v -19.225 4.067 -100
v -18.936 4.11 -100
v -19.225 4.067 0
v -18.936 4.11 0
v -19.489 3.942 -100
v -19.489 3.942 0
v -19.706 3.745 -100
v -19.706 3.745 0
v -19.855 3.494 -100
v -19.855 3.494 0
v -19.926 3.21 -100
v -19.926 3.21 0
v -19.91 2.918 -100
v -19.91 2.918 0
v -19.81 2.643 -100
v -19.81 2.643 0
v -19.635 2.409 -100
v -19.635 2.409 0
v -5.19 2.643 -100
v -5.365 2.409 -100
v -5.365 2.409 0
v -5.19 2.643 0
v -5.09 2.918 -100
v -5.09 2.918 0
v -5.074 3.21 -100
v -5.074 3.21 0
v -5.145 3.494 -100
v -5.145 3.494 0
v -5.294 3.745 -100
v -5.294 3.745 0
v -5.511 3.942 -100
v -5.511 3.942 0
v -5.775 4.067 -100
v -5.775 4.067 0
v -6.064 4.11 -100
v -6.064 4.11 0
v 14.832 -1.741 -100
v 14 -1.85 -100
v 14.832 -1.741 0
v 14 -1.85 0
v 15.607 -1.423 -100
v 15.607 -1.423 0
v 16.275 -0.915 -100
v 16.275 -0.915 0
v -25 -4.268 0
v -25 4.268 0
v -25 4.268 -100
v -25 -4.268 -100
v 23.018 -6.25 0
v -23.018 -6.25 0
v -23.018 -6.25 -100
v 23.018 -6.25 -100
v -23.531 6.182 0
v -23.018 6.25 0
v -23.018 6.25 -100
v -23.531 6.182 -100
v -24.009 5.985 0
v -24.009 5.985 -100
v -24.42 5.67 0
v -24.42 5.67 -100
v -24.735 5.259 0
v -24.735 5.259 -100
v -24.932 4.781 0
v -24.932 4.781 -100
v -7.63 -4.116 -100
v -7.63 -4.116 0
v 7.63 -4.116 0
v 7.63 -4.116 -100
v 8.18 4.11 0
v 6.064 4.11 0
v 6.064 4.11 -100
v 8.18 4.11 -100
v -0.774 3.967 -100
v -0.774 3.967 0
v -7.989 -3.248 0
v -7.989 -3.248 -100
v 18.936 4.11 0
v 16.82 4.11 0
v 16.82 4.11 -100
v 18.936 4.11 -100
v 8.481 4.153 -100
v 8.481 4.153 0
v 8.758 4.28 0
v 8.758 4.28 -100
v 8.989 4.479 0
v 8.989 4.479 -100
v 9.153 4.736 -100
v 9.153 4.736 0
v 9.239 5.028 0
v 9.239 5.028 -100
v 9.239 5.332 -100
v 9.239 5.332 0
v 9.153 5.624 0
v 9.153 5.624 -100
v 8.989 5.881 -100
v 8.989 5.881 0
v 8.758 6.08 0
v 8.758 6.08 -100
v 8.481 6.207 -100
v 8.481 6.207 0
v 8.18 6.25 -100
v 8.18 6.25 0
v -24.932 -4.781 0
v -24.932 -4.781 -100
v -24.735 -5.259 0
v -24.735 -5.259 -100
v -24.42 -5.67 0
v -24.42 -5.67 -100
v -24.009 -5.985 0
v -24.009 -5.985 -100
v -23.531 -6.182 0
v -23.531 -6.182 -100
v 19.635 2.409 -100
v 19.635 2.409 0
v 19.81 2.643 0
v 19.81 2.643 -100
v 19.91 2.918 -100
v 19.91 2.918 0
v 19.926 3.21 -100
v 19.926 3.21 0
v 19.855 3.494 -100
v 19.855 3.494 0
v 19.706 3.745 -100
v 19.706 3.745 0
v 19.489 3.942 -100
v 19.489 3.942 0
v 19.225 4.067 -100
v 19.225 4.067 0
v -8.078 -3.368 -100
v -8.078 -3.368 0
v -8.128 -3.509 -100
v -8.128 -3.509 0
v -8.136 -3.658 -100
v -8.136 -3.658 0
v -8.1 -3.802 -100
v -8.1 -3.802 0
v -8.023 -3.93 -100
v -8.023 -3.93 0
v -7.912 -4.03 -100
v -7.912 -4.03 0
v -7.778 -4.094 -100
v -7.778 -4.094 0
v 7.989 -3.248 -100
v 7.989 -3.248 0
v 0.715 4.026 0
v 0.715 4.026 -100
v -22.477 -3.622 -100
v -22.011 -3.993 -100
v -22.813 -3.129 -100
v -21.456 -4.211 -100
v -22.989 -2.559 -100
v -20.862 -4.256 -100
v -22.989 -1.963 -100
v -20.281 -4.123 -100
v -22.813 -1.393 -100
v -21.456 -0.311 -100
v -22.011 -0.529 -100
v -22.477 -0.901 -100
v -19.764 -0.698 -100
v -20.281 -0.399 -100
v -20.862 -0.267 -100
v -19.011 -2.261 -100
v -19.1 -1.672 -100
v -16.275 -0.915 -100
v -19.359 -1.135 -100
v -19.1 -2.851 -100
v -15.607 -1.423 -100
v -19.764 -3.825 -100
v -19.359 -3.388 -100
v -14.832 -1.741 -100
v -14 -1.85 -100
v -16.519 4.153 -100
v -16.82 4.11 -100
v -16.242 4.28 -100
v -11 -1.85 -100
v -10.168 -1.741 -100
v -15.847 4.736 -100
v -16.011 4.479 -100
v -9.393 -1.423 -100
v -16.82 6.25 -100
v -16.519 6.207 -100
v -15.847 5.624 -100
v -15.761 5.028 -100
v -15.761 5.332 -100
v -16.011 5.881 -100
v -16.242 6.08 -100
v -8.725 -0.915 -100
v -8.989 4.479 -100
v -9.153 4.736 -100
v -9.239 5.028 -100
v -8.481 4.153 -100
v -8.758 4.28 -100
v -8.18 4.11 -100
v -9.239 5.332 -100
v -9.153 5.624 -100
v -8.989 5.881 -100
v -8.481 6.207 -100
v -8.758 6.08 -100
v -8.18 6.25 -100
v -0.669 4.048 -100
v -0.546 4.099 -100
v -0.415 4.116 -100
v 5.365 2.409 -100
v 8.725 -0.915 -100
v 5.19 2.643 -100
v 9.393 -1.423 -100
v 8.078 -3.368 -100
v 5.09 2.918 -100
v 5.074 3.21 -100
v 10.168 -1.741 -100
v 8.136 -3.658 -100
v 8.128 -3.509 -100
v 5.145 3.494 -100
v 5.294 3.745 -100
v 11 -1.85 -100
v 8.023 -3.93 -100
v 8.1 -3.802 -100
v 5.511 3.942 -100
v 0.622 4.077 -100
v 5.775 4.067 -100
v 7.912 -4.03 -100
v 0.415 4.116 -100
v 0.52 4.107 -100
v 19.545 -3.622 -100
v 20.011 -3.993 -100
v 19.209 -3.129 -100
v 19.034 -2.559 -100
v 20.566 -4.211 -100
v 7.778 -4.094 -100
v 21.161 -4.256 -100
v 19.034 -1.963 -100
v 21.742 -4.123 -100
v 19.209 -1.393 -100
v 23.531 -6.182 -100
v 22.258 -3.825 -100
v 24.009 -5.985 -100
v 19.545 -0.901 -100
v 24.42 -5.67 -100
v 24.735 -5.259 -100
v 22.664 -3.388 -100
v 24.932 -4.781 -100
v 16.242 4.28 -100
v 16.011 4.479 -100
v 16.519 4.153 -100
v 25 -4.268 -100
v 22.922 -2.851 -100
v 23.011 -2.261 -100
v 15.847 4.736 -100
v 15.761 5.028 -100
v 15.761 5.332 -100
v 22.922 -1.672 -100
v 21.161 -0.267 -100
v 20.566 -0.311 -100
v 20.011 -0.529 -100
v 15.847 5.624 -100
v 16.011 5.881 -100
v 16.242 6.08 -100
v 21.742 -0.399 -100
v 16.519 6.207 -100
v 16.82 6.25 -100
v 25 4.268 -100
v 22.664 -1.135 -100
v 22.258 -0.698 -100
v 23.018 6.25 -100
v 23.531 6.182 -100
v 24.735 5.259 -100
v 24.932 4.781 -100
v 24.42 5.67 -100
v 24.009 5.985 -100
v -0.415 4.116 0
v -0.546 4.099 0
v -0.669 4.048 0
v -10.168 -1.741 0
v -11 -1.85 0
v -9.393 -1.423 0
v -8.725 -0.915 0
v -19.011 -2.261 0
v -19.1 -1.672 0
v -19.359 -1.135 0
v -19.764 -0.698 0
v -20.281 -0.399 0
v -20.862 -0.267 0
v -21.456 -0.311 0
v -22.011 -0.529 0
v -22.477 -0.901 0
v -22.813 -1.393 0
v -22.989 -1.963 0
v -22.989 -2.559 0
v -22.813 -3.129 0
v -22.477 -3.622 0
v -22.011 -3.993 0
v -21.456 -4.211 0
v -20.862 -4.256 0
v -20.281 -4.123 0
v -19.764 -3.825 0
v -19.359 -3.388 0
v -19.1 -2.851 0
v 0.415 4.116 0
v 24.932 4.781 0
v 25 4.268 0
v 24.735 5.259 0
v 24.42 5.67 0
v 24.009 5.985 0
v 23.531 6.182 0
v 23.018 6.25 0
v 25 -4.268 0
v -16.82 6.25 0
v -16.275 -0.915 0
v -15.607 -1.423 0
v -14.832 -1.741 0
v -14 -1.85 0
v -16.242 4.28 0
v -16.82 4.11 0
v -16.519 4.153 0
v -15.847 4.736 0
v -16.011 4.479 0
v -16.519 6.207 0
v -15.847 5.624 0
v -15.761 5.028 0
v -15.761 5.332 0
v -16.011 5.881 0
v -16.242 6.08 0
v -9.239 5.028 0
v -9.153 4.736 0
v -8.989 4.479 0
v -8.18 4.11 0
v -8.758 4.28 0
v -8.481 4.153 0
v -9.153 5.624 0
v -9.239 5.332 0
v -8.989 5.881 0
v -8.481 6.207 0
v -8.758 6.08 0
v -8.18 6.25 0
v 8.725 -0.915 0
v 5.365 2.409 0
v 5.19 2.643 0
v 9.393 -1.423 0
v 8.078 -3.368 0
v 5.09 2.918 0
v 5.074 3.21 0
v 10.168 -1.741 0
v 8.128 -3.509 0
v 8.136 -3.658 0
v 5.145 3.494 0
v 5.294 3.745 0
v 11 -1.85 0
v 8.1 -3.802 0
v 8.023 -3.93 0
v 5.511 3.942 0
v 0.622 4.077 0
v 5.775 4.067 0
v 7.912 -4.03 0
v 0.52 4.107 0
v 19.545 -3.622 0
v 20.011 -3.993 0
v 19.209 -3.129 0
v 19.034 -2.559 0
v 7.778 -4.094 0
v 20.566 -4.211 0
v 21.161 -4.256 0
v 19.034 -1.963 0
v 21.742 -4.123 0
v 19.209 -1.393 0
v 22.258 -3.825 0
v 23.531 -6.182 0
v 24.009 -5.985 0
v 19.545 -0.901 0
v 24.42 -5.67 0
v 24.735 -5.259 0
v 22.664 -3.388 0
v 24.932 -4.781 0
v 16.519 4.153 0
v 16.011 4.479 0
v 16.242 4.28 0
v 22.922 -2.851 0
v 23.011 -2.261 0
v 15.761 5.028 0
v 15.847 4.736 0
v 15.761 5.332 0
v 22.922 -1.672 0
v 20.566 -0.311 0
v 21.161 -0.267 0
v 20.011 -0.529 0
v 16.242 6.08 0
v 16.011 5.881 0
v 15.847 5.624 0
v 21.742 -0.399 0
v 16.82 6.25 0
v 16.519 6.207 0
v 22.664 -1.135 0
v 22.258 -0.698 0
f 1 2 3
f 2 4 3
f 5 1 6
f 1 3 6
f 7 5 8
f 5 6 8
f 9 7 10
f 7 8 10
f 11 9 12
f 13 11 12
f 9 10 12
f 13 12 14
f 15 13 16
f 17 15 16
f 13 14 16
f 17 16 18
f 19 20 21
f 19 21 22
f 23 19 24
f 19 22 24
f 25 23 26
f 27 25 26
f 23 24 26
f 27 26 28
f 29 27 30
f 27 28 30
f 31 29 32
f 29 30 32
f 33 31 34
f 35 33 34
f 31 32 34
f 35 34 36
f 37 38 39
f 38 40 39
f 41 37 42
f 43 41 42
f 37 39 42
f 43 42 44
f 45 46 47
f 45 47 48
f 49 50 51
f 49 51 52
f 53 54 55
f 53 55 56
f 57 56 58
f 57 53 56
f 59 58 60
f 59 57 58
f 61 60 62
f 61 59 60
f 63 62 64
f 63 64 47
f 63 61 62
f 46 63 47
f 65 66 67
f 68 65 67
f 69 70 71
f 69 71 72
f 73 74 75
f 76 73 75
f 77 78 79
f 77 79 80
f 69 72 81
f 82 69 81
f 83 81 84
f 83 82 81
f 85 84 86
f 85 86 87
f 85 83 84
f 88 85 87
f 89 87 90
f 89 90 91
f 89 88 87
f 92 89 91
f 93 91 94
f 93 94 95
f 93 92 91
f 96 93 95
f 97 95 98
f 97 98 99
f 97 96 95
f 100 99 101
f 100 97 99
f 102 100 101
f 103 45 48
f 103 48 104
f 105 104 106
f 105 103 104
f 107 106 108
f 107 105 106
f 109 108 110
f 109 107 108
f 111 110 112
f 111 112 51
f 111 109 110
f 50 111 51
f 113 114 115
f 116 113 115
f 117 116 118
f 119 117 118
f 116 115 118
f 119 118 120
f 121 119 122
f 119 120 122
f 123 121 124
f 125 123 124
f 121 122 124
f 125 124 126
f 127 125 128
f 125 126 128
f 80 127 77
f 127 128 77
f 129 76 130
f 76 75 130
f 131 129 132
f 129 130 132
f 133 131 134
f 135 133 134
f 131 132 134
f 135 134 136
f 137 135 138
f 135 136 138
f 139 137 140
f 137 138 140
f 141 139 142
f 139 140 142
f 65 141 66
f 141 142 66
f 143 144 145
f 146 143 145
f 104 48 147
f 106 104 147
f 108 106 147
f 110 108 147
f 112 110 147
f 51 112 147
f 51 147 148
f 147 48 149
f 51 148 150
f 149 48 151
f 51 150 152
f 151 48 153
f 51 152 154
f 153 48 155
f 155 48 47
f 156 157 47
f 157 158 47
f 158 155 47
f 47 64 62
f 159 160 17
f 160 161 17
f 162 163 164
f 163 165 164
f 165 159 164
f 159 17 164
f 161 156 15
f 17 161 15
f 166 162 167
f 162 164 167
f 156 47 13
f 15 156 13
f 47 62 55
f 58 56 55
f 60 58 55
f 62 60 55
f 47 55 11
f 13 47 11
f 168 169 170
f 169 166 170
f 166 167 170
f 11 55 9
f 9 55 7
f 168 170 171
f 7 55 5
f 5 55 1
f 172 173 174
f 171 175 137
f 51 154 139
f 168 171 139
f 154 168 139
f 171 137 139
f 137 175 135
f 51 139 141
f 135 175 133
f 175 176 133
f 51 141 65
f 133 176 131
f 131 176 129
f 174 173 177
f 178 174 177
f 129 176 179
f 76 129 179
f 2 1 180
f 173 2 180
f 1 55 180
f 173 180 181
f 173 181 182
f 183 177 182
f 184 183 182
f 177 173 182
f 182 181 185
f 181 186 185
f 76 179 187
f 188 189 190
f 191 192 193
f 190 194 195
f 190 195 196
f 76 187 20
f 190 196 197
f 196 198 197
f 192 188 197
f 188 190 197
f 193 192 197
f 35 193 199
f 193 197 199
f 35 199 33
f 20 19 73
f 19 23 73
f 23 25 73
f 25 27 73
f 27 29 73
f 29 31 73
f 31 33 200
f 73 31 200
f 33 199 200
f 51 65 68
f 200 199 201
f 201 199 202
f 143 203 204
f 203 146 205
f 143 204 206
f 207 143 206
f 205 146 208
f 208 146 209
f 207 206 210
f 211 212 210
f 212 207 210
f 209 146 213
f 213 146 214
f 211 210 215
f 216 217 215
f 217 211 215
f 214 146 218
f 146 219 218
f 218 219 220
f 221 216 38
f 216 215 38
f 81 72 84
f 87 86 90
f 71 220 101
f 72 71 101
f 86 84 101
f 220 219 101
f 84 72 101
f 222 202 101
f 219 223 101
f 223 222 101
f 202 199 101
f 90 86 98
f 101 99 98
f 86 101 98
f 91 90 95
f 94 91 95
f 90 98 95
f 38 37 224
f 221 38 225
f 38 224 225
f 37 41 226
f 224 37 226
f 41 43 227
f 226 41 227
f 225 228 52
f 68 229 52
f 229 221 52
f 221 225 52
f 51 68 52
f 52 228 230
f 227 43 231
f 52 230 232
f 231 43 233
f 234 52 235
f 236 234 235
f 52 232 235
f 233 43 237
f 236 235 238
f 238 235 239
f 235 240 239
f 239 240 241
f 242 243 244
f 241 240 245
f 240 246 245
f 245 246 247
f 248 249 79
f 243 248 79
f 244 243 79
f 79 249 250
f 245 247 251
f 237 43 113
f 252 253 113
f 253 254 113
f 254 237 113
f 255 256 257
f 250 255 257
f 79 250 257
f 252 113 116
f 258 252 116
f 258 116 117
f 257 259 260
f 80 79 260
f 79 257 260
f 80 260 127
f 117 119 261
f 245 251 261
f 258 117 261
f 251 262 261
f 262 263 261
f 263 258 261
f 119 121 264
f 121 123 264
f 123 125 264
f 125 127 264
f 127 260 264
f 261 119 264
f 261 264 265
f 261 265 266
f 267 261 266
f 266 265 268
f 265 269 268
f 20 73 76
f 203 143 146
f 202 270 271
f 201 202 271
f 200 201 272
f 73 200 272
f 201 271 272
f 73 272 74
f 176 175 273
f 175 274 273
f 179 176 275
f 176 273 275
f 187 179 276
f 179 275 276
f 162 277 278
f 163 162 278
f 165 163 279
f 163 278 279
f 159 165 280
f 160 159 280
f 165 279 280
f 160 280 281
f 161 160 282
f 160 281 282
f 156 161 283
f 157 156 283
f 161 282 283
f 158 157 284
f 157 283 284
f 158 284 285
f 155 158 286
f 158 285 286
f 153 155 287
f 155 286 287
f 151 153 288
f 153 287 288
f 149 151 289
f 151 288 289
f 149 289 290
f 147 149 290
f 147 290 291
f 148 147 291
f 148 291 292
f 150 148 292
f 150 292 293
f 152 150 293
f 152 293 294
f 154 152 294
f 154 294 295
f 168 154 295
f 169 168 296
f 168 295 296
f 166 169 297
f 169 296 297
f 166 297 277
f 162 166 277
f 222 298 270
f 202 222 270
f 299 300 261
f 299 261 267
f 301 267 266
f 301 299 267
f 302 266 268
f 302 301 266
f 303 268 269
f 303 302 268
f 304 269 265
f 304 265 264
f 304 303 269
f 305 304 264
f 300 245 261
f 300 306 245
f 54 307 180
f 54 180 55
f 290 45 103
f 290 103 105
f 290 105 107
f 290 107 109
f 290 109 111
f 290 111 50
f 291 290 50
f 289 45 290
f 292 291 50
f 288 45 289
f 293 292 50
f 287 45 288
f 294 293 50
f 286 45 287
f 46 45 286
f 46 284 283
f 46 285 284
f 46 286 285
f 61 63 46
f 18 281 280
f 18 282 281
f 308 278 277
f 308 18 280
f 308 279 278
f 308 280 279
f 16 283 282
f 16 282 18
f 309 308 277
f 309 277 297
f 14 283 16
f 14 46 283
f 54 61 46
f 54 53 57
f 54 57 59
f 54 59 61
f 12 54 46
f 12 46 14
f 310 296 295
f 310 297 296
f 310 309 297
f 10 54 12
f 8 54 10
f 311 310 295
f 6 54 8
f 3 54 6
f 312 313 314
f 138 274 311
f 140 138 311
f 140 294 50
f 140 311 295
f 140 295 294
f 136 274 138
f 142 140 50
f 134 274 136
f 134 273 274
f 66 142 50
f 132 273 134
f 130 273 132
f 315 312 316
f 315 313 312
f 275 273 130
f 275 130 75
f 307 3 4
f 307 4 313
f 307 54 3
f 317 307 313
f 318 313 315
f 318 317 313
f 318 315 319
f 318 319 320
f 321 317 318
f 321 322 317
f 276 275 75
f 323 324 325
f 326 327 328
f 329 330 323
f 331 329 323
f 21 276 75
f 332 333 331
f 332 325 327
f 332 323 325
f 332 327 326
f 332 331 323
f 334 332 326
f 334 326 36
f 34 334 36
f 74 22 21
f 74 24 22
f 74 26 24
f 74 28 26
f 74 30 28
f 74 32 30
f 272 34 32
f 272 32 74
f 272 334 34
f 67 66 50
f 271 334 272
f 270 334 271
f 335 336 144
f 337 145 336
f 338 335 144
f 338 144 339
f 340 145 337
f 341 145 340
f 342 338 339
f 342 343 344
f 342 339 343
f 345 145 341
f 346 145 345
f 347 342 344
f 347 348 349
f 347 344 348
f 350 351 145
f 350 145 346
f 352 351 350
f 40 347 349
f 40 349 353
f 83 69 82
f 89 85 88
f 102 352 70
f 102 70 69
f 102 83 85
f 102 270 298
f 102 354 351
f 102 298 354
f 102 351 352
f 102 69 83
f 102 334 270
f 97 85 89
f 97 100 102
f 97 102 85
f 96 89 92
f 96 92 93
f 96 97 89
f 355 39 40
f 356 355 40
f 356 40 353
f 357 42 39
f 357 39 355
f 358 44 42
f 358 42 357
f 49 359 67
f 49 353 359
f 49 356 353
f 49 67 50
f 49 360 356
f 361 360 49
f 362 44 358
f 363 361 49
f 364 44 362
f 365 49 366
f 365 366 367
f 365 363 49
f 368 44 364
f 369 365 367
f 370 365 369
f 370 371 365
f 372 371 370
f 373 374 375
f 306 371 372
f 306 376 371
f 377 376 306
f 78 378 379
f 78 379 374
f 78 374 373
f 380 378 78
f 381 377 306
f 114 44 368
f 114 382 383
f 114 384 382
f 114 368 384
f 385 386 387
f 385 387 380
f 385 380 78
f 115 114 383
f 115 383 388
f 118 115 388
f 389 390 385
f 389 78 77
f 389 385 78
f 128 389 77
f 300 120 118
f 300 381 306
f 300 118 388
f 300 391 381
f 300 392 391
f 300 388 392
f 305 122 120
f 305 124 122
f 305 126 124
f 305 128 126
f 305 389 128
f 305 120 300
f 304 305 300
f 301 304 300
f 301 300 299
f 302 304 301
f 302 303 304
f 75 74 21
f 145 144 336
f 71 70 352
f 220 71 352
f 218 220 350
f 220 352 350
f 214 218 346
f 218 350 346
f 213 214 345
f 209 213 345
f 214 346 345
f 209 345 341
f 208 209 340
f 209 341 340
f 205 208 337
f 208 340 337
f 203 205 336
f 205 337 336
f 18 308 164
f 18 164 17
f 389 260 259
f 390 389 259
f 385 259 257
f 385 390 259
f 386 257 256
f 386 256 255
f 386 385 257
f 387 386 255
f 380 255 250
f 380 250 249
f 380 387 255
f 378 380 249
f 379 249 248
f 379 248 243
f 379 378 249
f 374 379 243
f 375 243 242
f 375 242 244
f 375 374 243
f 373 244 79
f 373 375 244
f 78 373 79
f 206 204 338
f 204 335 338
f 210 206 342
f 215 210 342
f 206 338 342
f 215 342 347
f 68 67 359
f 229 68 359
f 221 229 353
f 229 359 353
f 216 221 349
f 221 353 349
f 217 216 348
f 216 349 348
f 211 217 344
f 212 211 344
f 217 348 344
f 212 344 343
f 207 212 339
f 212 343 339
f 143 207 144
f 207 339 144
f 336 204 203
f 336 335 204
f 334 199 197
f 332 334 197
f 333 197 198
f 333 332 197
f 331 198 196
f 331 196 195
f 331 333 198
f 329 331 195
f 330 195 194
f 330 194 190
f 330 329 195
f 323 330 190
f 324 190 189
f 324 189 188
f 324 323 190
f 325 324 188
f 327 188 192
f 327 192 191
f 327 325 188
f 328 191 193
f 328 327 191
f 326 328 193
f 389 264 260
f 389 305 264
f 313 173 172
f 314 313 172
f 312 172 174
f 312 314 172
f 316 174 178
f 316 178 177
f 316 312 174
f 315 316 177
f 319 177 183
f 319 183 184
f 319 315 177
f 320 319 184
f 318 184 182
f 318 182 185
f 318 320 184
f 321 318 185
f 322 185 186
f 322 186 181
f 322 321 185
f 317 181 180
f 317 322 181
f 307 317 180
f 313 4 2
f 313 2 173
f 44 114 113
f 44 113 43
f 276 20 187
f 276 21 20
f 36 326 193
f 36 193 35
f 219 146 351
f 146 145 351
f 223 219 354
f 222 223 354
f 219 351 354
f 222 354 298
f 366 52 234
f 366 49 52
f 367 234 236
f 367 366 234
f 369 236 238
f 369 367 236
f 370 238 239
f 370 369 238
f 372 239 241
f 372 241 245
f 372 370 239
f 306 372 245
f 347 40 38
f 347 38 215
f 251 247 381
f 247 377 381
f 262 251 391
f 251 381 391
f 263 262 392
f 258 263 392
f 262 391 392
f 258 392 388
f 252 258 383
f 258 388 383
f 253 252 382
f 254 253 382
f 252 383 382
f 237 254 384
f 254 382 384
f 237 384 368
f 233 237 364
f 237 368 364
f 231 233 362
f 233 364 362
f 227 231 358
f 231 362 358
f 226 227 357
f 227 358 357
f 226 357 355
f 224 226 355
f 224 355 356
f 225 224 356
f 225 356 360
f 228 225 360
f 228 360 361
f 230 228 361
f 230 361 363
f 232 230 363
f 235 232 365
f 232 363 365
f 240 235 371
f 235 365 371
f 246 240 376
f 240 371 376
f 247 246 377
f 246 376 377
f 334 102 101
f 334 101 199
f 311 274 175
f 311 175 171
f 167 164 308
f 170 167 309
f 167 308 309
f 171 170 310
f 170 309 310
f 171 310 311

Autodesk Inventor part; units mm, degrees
ref_plane "YZ Plane" through (0, 0, 0) normal (1, 0, 0) x (0, 1, 0)
ref_plane "XZ Plane" through (0, 0, 0) normal (0, 1, 0) x (-1, 0, 0)
ref_plane "XY Plane" through (0, 0, 0) normal (0, 0, 1) x (1, 0, 0)
sketch "Sketch1" plane through (0, 0, 0) normal (0, 0, 1) x (1, 0, 0)
  arc A0 (-0.4146, 4.1159) -> (-0.7739, 3.967) centre (-0.4146, 3.6077) ccw
  line L0 (0.4146, 4.1159) -> (-0.4146, 4.1159)
  arc A1 (0.7154, 4.0255) -> (0.4146, 4.1159) centre (0.426, 3.6079) ccw
  line L1 (7.9894, -3.2484) -> (0.7154, 4.0255)
  arc A2 (7.63, -4.1159) -> (7.9894, -3.2484) centre (7.63, -3.6077) ccw
  line L2 (-7.63, -4.1159) -> (7.63, -4.1159)
  arc A3 (-7.9894, -3.2484) -> (-7.63, -4.1159) centre (-7.63, -3.6077) ccw
  line L3 (-0.7739, 3.967) -> (-7.9894, -3.2484)
  circle A4 centre (-21.0112, -2.2612) radius 2
  circle A5 centre (21.0112, -2.2612) radius 2
  arc A6 (-23.0183, 6.25) -> (-25, 4.2683) centre (-23.0183, 4.2683) ccw
  line L4 (-25, 4.2683) -> (-25, -4.2683)
  arc A7 (-25, -4.2683) -> (-23.0183, -6.25) centre (-23.0183, -4.2683) ccw
  line L5 (-23.0183, -6.25) -> (23.0183, -6.25)
  arc A8 (23.0183, -6.25) -> (25, -4.2683) centre (23.0183, -4.2683) ccw
  line L6 (25, -4.2683) -> (25, 4.2683)
  arc A9 (25, 4.2683) -> (23.0183, 6.25) centre (23.0183, 4.2683) ccw
  line L7 (23.0183, 6.25) -> (16.82, 6.25)
  arc A10 (16.82, 6.25) -> (16.82, 4.11) centre (16.82, 5.18) ccw
  line L8 (16.82, 4.11) -> (18.9356, 4.11)
  arc A11 (19.6349, 2.4086) -> (18.9356, 4.11) centre (18.9356, 3.1156) ccw
  line L9 (19.6349, 2.4086) -> (16.275, -0.9151)
  arc A12 (14.0005, -1.85) -> (16.275, -0.9151) centre (14.0005, 1.3841) ccw
  line L10 (14.0005, -1.85) -> (10.9995, -1.85)
  arc A13 (8.725, -0.9151) -> (10.9995, -1.85) centre (10.9995, 1.3841) ccw
  line L11 (8.725, -0.9151) -> (5.3651, 2.4086)
  arc A14 (6.0644, 4.11) -> (5.3651, 2.4086) centre (6.0644, 3.1156) ccw
  line L12 (6.0644, 4.11) -> (8.18, 4.11)
  arc A15 (8.18, 4.11) -> (8.18, 6.25) centre (8.18, 5.18) ccw
  line L13 (8.18, 6.25) -> (-8.18, 6.25)
  arc A16 (-8.18, 6.25) -> (-8.18, 4.11) centre (-8.18, 5.18) ccw
  line L14 (-8.18, 4.11) -> (-6.0644, 4.11)
  arc A17 (-5.3651, 2.4086) -> (-6.0644, 4.11) centre (-6.0644, 3.1156) ccw
  line L15 (-5.3651, 2.4086) -> (-8.725, -0.9151)
  arc A18 (-10.9995, -1.85) -> (-8.725, -0.9151) centre (-10.9995, 1.3841) ccw
  line L16 (-10.9995, -1.85) -> (-14.0005, -1.85)
  arc A19 (-16.275, -0.9151) -> (-14.0005, -1.85) centre (-14.0005, 1.3841) ccw
  line L17 (-16.275, -0.9151) -> (-19.6349, 2.4086)
  arc A20 (-18.9356, 4.11) -> (-19.6349, 2.4086) centre (-18.9356, 3.1156) ccw
  line L18 (-18.9356, 4.11) -> (-16.82, 4.11)
  arc A21 (-16.82, 4.11) -> (-16.82, 6.25) centre (-16.82, 5.18) ccw
  line L19 (-16.82, 6.25) -> (-23.0183, 6.25)
  point P0 (0, 0)
extrude "Extrusion1" add sketch "Sketch1" against normal blind 100
properties part number "25-5013"
